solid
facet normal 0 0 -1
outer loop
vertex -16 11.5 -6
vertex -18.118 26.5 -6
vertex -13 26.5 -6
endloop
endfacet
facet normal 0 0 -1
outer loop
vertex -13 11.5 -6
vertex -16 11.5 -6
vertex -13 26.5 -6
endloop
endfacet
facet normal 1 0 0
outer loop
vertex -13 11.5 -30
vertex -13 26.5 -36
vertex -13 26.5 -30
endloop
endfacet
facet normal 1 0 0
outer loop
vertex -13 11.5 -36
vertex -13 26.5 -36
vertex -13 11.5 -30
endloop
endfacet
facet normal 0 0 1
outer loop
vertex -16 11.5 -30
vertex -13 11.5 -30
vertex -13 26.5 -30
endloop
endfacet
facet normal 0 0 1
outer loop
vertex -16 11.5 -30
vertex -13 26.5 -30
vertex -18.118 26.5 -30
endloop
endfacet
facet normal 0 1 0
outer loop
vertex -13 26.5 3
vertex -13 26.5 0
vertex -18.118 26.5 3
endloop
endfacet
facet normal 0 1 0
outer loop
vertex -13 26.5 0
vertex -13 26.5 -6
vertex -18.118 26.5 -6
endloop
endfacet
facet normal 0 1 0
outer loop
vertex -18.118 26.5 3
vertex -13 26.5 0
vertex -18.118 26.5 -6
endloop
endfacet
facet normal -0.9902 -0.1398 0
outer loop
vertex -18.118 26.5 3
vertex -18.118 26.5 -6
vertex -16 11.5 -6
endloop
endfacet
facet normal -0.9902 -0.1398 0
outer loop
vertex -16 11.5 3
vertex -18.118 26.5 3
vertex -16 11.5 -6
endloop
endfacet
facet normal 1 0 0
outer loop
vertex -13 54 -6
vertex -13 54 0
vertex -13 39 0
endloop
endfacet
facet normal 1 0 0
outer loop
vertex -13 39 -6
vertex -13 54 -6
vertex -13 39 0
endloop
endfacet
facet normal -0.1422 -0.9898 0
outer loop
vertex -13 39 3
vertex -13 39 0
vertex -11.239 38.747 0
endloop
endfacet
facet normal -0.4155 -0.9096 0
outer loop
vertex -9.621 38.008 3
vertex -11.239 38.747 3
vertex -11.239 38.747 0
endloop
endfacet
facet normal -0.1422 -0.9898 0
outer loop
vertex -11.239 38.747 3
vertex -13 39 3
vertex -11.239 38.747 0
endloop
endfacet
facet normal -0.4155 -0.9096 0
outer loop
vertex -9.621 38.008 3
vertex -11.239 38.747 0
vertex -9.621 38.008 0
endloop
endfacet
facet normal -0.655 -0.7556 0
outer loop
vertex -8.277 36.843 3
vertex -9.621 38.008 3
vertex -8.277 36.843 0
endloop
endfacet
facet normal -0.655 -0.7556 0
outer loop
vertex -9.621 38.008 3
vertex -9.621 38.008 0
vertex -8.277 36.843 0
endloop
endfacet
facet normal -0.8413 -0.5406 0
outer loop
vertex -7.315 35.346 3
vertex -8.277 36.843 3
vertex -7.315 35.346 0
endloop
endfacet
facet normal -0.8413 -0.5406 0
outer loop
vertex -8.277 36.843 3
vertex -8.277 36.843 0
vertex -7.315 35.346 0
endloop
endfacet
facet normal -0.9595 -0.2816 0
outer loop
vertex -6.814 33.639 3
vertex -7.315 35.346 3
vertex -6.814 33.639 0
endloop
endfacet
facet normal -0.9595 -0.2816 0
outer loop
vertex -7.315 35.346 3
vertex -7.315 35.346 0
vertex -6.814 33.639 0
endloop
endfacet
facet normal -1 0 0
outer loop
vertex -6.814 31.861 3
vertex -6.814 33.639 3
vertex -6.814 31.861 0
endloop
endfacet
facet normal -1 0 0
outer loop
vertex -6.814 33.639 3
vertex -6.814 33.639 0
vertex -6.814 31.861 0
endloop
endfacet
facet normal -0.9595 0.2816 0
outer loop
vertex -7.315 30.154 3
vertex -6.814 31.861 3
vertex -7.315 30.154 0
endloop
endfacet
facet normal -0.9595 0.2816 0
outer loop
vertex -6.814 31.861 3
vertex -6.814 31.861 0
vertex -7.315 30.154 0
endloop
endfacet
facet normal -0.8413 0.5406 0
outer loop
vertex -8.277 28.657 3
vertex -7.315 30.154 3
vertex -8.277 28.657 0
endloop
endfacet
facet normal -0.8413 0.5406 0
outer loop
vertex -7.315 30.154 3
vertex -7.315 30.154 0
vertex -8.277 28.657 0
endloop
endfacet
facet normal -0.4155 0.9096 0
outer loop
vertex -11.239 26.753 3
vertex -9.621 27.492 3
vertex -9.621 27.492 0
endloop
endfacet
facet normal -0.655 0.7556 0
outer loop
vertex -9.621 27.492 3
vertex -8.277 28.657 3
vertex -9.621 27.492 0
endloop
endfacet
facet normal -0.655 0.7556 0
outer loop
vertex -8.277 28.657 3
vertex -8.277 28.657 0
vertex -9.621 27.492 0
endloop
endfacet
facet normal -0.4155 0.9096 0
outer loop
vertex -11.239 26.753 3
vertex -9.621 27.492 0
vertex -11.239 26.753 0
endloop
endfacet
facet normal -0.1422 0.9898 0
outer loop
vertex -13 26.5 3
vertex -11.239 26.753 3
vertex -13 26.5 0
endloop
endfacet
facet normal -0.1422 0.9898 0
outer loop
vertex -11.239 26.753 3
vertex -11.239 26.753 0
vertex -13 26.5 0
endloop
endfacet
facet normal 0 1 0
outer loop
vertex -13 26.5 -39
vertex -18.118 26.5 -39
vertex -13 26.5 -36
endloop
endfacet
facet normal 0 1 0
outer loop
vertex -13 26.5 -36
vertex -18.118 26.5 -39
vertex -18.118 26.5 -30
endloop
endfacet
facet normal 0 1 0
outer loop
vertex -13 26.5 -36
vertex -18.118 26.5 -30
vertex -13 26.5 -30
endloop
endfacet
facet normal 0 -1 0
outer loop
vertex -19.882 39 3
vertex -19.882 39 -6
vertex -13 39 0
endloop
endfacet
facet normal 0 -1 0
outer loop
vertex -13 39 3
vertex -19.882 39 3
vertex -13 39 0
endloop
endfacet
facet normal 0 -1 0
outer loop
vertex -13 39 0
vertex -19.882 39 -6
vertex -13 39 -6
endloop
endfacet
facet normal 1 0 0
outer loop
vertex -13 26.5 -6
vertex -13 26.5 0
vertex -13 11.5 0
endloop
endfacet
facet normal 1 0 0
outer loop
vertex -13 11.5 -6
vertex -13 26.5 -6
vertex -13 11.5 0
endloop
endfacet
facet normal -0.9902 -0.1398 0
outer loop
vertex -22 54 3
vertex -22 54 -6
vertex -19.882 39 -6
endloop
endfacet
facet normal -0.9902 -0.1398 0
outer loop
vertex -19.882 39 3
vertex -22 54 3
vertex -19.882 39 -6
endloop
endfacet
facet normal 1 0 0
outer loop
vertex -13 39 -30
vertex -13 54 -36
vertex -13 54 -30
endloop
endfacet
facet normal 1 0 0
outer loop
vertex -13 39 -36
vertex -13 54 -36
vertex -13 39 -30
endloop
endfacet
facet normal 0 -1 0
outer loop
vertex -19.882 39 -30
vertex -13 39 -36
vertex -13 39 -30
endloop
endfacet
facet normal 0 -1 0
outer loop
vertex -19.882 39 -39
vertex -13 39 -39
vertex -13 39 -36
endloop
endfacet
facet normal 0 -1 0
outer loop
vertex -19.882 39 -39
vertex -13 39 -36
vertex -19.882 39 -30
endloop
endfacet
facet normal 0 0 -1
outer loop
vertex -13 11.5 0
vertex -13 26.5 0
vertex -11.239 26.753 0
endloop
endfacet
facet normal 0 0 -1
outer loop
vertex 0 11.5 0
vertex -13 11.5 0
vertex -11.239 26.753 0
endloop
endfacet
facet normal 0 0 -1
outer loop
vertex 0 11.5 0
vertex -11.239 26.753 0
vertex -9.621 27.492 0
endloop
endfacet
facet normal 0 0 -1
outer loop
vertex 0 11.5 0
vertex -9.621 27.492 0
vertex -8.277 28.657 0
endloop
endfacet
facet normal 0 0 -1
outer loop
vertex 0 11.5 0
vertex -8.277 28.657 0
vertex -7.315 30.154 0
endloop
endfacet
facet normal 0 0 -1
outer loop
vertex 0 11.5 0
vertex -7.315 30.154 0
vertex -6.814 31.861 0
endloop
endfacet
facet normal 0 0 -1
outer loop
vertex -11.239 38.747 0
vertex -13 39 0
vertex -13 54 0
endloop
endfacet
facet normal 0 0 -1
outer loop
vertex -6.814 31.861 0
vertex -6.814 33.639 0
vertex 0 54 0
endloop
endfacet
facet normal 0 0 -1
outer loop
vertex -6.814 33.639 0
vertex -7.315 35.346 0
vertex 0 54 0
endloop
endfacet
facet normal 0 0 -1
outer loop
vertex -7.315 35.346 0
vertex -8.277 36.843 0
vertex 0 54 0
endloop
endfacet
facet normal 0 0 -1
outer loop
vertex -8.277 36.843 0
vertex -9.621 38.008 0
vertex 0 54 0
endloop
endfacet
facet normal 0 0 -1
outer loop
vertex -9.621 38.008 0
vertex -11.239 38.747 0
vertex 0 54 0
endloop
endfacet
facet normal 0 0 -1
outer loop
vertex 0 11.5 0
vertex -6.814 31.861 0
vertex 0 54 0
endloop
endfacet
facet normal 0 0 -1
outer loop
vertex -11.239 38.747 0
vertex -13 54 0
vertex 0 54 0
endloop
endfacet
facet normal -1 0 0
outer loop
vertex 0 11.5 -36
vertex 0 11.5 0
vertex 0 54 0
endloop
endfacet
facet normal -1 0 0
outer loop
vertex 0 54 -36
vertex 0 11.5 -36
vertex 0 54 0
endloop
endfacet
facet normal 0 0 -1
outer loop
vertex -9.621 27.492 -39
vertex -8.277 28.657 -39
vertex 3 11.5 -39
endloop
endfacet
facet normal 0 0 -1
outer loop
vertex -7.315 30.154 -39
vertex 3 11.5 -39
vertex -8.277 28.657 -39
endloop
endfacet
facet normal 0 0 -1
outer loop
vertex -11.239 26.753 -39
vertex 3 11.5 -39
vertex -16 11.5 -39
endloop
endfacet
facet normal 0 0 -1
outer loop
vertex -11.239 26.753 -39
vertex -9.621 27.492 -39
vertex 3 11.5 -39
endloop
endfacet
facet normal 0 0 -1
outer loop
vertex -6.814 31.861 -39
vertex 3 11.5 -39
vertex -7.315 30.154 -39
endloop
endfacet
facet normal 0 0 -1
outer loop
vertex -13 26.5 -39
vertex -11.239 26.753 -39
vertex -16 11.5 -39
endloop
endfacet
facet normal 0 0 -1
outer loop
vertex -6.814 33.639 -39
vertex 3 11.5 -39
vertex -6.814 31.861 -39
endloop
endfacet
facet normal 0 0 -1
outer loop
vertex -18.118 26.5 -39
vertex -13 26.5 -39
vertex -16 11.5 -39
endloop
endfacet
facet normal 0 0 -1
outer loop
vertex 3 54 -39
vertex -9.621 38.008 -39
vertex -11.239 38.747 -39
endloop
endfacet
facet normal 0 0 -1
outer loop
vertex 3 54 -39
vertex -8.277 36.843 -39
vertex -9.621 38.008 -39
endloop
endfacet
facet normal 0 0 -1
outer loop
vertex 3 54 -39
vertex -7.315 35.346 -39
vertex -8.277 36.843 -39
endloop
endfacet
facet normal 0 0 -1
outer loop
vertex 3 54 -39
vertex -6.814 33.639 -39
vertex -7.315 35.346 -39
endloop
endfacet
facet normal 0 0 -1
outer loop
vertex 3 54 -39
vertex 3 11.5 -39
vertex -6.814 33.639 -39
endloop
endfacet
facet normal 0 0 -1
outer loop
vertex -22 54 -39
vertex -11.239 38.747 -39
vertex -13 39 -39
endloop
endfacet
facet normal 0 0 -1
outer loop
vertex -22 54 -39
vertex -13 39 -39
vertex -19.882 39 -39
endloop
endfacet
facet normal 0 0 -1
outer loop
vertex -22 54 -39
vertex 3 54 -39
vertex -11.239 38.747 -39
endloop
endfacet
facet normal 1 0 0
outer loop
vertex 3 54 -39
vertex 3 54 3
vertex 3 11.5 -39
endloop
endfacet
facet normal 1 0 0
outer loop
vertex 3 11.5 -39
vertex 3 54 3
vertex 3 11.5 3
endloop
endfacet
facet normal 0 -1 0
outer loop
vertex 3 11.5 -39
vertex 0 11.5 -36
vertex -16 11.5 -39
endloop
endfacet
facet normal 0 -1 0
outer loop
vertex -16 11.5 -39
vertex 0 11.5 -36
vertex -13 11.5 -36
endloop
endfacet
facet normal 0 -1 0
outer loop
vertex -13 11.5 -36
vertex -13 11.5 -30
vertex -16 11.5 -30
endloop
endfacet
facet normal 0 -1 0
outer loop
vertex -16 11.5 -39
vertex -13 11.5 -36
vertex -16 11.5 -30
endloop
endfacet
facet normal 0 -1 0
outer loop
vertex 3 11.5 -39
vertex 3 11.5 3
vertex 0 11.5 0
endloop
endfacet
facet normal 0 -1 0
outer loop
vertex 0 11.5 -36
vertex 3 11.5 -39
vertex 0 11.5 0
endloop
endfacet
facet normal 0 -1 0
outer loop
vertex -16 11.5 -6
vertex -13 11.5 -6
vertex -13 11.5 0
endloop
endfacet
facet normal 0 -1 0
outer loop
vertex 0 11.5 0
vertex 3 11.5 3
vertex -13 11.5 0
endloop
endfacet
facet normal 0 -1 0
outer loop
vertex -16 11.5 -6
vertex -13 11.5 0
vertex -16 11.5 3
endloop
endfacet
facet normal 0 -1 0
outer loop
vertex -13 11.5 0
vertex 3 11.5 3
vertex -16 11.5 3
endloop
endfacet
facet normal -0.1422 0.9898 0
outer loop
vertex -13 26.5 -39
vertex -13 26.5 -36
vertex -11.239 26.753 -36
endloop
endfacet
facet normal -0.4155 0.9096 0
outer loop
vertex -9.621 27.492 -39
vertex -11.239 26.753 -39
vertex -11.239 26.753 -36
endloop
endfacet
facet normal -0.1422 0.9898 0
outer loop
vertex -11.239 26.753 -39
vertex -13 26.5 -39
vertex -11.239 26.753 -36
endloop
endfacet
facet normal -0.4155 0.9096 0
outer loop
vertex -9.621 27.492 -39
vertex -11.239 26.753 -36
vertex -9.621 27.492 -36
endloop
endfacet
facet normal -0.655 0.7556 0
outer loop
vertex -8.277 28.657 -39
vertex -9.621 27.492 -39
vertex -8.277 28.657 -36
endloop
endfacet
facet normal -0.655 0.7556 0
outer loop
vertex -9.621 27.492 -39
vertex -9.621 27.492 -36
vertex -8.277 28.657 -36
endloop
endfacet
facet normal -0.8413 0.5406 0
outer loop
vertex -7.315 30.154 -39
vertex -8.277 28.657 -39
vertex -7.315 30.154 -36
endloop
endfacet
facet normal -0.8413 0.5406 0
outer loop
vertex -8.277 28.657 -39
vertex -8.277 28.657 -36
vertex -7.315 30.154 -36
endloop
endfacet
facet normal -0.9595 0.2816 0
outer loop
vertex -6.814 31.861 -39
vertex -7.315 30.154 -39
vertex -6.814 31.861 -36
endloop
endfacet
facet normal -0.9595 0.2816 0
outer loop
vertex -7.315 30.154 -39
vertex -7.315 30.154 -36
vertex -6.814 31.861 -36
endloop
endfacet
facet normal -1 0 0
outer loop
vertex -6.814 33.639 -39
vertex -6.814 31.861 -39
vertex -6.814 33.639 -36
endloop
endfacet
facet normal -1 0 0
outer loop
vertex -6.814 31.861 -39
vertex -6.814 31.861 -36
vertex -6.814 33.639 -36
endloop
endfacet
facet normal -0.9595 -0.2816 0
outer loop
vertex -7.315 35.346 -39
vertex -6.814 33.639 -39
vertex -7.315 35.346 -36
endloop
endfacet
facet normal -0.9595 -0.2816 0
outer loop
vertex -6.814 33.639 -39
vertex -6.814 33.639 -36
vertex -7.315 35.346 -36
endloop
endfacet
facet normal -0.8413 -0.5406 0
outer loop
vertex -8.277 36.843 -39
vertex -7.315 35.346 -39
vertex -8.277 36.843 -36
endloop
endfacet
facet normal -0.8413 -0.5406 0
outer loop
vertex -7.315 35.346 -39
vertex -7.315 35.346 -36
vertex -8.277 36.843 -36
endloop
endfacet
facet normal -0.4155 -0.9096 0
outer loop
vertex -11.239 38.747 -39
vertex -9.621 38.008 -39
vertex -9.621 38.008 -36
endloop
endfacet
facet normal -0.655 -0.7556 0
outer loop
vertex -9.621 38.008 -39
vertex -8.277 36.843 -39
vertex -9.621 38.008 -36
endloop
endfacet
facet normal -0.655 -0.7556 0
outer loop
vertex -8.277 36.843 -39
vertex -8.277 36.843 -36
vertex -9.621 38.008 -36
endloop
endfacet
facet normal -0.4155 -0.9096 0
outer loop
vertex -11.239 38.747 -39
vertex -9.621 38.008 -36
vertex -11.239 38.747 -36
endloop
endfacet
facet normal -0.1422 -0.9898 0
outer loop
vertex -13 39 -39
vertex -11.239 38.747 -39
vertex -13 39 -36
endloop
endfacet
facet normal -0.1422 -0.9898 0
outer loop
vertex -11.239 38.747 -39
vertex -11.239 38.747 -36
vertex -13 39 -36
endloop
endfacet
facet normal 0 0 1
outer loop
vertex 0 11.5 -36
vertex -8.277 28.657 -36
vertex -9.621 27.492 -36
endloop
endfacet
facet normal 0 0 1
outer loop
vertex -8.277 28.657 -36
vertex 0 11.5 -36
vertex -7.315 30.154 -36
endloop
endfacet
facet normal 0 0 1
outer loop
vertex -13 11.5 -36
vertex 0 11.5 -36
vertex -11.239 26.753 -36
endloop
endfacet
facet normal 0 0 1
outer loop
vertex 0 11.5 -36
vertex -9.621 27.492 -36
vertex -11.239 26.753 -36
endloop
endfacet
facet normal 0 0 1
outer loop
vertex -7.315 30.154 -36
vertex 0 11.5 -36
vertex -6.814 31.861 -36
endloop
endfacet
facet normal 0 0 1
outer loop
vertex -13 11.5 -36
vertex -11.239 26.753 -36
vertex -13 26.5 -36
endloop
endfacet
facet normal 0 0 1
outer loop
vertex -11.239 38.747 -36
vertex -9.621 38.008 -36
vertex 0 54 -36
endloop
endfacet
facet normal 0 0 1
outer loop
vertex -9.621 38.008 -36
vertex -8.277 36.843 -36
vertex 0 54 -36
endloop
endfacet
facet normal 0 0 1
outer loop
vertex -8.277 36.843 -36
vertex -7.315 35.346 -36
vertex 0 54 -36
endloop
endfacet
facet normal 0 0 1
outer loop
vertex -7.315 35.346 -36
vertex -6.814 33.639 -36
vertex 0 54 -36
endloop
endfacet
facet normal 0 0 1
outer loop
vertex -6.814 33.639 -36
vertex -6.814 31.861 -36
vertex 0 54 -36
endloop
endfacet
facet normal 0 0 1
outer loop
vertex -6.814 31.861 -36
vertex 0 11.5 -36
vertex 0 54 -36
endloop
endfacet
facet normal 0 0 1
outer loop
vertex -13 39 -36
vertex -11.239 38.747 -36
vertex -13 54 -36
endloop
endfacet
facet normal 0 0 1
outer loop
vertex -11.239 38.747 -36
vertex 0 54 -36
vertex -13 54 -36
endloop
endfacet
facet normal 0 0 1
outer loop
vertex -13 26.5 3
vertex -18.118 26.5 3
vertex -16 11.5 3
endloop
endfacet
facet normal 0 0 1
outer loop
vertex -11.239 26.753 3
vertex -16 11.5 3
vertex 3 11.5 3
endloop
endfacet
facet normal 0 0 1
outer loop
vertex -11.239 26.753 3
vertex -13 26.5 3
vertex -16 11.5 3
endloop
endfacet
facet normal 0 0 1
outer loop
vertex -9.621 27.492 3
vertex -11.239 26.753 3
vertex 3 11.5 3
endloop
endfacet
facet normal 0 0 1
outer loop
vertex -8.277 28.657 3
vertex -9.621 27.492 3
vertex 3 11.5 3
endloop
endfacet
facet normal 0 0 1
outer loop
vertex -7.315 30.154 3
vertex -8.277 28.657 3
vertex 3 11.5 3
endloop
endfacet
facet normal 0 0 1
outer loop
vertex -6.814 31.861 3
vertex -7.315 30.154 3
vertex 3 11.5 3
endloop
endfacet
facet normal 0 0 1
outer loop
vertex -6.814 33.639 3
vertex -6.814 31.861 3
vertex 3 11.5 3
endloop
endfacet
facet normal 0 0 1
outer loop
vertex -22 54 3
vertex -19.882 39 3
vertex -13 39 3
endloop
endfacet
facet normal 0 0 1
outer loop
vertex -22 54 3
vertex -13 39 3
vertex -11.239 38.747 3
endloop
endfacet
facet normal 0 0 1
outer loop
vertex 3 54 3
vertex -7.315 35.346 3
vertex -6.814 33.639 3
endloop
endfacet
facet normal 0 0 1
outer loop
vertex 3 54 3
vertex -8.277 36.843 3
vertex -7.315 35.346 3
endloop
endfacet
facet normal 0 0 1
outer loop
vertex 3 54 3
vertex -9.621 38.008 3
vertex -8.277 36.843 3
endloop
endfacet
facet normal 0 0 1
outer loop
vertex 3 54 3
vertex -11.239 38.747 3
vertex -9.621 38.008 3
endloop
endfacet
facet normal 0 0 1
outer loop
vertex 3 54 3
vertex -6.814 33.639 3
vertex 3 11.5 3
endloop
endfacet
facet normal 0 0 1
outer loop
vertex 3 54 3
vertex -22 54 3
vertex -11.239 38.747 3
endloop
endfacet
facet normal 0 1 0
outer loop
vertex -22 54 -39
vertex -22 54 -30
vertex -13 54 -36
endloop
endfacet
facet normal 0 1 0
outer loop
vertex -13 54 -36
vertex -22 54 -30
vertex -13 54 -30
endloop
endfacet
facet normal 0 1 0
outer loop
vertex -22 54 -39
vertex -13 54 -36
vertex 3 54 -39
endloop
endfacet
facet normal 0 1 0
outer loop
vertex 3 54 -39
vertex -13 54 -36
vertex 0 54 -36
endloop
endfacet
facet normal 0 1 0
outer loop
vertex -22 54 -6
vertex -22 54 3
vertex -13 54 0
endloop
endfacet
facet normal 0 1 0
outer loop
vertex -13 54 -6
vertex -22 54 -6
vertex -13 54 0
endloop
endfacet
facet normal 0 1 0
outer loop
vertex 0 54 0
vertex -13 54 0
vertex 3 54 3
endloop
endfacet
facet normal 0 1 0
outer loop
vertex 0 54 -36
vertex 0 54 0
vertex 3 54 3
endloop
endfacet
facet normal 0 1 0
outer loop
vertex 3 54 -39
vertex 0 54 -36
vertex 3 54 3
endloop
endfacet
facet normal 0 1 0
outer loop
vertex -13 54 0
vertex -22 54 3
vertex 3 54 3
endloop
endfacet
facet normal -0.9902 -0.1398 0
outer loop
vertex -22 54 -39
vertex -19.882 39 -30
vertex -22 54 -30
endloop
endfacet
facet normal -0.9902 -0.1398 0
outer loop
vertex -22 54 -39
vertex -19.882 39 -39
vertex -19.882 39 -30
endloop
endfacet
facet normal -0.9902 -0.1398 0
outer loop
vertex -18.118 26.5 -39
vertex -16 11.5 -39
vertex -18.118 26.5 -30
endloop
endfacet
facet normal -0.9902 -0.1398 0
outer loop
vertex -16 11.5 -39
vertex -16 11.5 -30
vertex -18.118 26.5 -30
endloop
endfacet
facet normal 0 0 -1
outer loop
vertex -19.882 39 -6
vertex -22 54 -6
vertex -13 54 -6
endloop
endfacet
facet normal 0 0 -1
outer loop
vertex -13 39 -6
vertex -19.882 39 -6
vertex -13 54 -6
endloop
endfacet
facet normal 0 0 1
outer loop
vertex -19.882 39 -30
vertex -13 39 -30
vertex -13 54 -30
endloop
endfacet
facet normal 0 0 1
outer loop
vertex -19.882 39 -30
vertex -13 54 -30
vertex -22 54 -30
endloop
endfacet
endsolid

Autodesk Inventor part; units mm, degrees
ref_plane "YZ Plane" through (0, 0, 0) normal (1, 0, 0) x (0, 1, 0)
ref_plane "XZ Plane" through (0, 0, 0) normal (0, 1, 0) x (-1, 0, 0)
ref_plane "XY Plane" through (0, 0, 0) normal (0, 0, 1) x (1, 0, 0)
sketch "Sketch1" plane through (0, 0, 0) normal (0, 0, 1) x (1, 0, 0)
  line L0 (-11.5, 1.5) -> (-11.5, 64) projected
  line L1 (-1.5, 1.5) -> (-11.5, 1.5) projected
  line L2 (-1.5, 64) -> (-1.5, 1.5) projected
  arc A0 (-1.5, 64) -> (-6, 68.5) centre (-6, 64) ccw projected
  line L3 (-7, 68.5) -> (-6, 68.5) projected
  arc A1 (-7, 68.5) -> (-11.5, 64) centre (-7, 64) ccw projected
  line L4 (-13, 64) -> (-13, 1.5) projected
  line L5 (0, 1.5) -> (0, 64) projected
  line L6 (-11.5, 0) -> (-1.5, 0) projected
  arc A2 (-13, 1.5) -> (-11.5, 0) centre (-11.5, 1.5) ccw projected
  arc A3 (-1.5, 0) -> (0, 1.5) centre (-1.5, 1.5) ccw projected
  arc A4 (-7, 70) -> (-13, 64) centre (-7, 64) ccw projected
  arc A5 (0, 64) -> (-6, 70) centre (-6, 64) ccw projected
  line L7 (-6, 70) -> (-7, 70) projected
  line L8 (-13, 1.5) -> (-13, 11.5)
  line L9 (-13, 64) -> (-13, 54)
  line L10 (0, 1.5) -> (0, 11.5)
  line L11 (0, 54) -> (0, 64)
  line L12 (0, 11.5) -> (3, 11.5)
  line L13 (3, 11.5) -> (3, 54)
  line L14 (3, 54) -> (0, 54)
  line L15 (0, 11.5) -> (0, 54)
  line L16 (-13, 11.5) -> (-16, 11.5)
  line L17 (-13, 54) -> (-22, 54)
  line L18 (-13, 11.5) -> (-13, 54)
  line L19 (-13, 11.5) -> (-13, 26.5)
  line L20 (-13, 26.5) -> (-18.1176, 26.5)
  line L21 (-13, 54) -> (-13, 39)
  line L22 (-13, 39) -> (-19.8824, 39)
  line L23 (-16, 11.5) -> (-18.1176, 26.5)
  line L24 (-19.8824, 39) -> (-22, 54)
  point P0 (0, 0)
  dimension "d0" = 10
  dimension "d1" = 10
  dimension "d2" = 3
  dimension "d3" = 3
  dimension "d4" = 9
  dimension "d5" = 15
  dimension "d6" = 15
extrude "Extrusion1" add sketch "Sketch1" against normal blind 6 contours L4 L22 L24 L17 | L4 L16 L23 L20 | L14 L13 L12 L5
sketch "Sketch2" plane through (0, 0, 0) normal (0, 0, 1) x (1, 0, 0)
  line L0 (-18.1176, 26.5) -> (-16, 11.5) projected
  line L1 (-16, 11.5) -> (-13, 11.5) projected
  line L2 (-13, 26.5) -> (-18.1176, 26.5) projected
  line L3 (-19.8824, 39) -> (-13, 39) projected
  line L4 (-22, 54) -> (-19.8824, 39) projected
  line L5 (-13, 54) -> (-22, 54) projected
  line L6 (0, 11.5) -> (3, 11.5) projected
  line L7 (3, 11.5) -> (3, 54) projected
  line L8 (3, 54) -> (0, 54) projected
  line L9 (0, 11.5) -> (-13, 11.5)
  line L10 (-13, 54) -> (0, 54)
  arc A0 (-13, 26.5) -> (-13, 39) centre (-13, 32.75) ccw
  point P0 (0, 0)
extrude "Extrusion2" add sketch "Sketch2" along normal blind 3
ref_plane "Work Plane8" through (0, 70, -36) normal (0, 0, -1) x (-1, 0, 0)
sketch "Sketch3" plane through (0, 70, -36) normal (0, 0, -1) x (-1, 0, 0)
  line L0 (22, -16) -> (13, -16) projected
  line L1 (13, -16) -> (13, -31) projected
  line L2 (13, -31) -> (19.8824, -31) projected
  line L3 (19.8824, -31) -> (22, -16) projected
  line L4 (13, -43.5) -> (13, -58.5) projected
  line L5 (13, -58.5) -> (16, -58.5) projected
  line L6 (16, -58.5) -> (18.1176, -43.5) projected
  line L7 (18.1176, -43.5) -> (13, -43.5) projected
  line L8 (-3, -58.5) -> (0, -58.5) projected
  line L9 (0, -58.5) -> (0, -16) projected
  line L10 (0, -16) -> (-3, -16) projected
  line L11 (-3, -16) -> (-3, -58.5) projected
  point P0 (0, -70)
extrude "Extrusion3" add sketch "Sketch3" against normal blind 6
ref_plane "Work Plane7" through (0, 70, -36) normal (0, 0, -1) x (-1, 0, 0)
sketch "Sketch4" plane through (0, 70, -36) normal (0, 0, -1) x (-1, 0, 0)
  line L0 (22, -16) -> (13, -16) projected
  line L1 (13, -16) -> (13, -31) projected
  line L2 (13, -31) -> (19.8824, -31) projected
  line L3 (19.8824, -31) -> (22, -16) projected
  line L4 (13, -43.5) -> (13, -58.5) projected
  line L5 (13, -58.5) -> (16, -58.5) projected
  line L6 (16, -58.5) -> (18.1176, -43.5) projected
  line L7 (18.1176, -43.5) -> (13, -43.5) projected
  line L8 (-3, -58.5) -> (0, -58.5) projected
  line L9 (0, -58.5) -> (0, -16) projected
  line L10 (0, -16) -> (-3, -16) projected
  line L11 (-3, -16) -> (-3, -58.5) projected
  line L12 (18.1176, -43.5) -> (16, -58.5) projected
  line L13 (16, -58.5) -> (-3, -58.5) projected
  line L14 (-3, -58.5) -> (-3, -16) projected
  line L15 (-3, -16) -> (22, -16) projected
  line L16 (22, -16) -> (19.8824, -31) projected
  line L17 (19.8824, -31) -> (13, -31) projected
  arc A0 (13, -31) -> (13, -43.5) centre (13, -37.25) ccw projected
  line L18 (13, -43.5) -> (18.1176, -43.5) projected
  point P0 (0, -70)
extrude "Extrusion4" add sketch "Sketch4" along normal blind 3
sketch "Sketch5" plane through (0, 0, -6) normal (0, 0, -1) x (-1, 0, 0)
  line L0 (-3, 11.5) -> (0, 11.5) projected
  line L1 (0, 11.5) -> (0, 54) projected
  line L2 (0, 54) -> (-3, 54) projected
  line L3 (-3, 54) -> (-3, 11.5) projected
  point P0 (0, 0)
extrude "Extrusion5" add sketch "Sketch5" along normal up to next
properties part number "soporte baterias"
